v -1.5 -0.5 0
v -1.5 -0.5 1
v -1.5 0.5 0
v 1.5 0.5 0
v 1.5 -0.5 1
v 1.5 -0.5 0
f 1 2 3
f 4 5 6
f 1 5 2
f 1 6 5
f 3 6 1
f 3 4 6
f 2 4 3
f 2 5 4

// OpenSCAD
// Triangular Prism (Right) for Stacks of Shapes
// by Slashee the Cow

color("Crimson")
translate([-1.5, -0.5, 0])
    rotate([90,0,90])
        linear_extrude(3, true)
            polygon([[0,0],[0,1],[1,0]]);
